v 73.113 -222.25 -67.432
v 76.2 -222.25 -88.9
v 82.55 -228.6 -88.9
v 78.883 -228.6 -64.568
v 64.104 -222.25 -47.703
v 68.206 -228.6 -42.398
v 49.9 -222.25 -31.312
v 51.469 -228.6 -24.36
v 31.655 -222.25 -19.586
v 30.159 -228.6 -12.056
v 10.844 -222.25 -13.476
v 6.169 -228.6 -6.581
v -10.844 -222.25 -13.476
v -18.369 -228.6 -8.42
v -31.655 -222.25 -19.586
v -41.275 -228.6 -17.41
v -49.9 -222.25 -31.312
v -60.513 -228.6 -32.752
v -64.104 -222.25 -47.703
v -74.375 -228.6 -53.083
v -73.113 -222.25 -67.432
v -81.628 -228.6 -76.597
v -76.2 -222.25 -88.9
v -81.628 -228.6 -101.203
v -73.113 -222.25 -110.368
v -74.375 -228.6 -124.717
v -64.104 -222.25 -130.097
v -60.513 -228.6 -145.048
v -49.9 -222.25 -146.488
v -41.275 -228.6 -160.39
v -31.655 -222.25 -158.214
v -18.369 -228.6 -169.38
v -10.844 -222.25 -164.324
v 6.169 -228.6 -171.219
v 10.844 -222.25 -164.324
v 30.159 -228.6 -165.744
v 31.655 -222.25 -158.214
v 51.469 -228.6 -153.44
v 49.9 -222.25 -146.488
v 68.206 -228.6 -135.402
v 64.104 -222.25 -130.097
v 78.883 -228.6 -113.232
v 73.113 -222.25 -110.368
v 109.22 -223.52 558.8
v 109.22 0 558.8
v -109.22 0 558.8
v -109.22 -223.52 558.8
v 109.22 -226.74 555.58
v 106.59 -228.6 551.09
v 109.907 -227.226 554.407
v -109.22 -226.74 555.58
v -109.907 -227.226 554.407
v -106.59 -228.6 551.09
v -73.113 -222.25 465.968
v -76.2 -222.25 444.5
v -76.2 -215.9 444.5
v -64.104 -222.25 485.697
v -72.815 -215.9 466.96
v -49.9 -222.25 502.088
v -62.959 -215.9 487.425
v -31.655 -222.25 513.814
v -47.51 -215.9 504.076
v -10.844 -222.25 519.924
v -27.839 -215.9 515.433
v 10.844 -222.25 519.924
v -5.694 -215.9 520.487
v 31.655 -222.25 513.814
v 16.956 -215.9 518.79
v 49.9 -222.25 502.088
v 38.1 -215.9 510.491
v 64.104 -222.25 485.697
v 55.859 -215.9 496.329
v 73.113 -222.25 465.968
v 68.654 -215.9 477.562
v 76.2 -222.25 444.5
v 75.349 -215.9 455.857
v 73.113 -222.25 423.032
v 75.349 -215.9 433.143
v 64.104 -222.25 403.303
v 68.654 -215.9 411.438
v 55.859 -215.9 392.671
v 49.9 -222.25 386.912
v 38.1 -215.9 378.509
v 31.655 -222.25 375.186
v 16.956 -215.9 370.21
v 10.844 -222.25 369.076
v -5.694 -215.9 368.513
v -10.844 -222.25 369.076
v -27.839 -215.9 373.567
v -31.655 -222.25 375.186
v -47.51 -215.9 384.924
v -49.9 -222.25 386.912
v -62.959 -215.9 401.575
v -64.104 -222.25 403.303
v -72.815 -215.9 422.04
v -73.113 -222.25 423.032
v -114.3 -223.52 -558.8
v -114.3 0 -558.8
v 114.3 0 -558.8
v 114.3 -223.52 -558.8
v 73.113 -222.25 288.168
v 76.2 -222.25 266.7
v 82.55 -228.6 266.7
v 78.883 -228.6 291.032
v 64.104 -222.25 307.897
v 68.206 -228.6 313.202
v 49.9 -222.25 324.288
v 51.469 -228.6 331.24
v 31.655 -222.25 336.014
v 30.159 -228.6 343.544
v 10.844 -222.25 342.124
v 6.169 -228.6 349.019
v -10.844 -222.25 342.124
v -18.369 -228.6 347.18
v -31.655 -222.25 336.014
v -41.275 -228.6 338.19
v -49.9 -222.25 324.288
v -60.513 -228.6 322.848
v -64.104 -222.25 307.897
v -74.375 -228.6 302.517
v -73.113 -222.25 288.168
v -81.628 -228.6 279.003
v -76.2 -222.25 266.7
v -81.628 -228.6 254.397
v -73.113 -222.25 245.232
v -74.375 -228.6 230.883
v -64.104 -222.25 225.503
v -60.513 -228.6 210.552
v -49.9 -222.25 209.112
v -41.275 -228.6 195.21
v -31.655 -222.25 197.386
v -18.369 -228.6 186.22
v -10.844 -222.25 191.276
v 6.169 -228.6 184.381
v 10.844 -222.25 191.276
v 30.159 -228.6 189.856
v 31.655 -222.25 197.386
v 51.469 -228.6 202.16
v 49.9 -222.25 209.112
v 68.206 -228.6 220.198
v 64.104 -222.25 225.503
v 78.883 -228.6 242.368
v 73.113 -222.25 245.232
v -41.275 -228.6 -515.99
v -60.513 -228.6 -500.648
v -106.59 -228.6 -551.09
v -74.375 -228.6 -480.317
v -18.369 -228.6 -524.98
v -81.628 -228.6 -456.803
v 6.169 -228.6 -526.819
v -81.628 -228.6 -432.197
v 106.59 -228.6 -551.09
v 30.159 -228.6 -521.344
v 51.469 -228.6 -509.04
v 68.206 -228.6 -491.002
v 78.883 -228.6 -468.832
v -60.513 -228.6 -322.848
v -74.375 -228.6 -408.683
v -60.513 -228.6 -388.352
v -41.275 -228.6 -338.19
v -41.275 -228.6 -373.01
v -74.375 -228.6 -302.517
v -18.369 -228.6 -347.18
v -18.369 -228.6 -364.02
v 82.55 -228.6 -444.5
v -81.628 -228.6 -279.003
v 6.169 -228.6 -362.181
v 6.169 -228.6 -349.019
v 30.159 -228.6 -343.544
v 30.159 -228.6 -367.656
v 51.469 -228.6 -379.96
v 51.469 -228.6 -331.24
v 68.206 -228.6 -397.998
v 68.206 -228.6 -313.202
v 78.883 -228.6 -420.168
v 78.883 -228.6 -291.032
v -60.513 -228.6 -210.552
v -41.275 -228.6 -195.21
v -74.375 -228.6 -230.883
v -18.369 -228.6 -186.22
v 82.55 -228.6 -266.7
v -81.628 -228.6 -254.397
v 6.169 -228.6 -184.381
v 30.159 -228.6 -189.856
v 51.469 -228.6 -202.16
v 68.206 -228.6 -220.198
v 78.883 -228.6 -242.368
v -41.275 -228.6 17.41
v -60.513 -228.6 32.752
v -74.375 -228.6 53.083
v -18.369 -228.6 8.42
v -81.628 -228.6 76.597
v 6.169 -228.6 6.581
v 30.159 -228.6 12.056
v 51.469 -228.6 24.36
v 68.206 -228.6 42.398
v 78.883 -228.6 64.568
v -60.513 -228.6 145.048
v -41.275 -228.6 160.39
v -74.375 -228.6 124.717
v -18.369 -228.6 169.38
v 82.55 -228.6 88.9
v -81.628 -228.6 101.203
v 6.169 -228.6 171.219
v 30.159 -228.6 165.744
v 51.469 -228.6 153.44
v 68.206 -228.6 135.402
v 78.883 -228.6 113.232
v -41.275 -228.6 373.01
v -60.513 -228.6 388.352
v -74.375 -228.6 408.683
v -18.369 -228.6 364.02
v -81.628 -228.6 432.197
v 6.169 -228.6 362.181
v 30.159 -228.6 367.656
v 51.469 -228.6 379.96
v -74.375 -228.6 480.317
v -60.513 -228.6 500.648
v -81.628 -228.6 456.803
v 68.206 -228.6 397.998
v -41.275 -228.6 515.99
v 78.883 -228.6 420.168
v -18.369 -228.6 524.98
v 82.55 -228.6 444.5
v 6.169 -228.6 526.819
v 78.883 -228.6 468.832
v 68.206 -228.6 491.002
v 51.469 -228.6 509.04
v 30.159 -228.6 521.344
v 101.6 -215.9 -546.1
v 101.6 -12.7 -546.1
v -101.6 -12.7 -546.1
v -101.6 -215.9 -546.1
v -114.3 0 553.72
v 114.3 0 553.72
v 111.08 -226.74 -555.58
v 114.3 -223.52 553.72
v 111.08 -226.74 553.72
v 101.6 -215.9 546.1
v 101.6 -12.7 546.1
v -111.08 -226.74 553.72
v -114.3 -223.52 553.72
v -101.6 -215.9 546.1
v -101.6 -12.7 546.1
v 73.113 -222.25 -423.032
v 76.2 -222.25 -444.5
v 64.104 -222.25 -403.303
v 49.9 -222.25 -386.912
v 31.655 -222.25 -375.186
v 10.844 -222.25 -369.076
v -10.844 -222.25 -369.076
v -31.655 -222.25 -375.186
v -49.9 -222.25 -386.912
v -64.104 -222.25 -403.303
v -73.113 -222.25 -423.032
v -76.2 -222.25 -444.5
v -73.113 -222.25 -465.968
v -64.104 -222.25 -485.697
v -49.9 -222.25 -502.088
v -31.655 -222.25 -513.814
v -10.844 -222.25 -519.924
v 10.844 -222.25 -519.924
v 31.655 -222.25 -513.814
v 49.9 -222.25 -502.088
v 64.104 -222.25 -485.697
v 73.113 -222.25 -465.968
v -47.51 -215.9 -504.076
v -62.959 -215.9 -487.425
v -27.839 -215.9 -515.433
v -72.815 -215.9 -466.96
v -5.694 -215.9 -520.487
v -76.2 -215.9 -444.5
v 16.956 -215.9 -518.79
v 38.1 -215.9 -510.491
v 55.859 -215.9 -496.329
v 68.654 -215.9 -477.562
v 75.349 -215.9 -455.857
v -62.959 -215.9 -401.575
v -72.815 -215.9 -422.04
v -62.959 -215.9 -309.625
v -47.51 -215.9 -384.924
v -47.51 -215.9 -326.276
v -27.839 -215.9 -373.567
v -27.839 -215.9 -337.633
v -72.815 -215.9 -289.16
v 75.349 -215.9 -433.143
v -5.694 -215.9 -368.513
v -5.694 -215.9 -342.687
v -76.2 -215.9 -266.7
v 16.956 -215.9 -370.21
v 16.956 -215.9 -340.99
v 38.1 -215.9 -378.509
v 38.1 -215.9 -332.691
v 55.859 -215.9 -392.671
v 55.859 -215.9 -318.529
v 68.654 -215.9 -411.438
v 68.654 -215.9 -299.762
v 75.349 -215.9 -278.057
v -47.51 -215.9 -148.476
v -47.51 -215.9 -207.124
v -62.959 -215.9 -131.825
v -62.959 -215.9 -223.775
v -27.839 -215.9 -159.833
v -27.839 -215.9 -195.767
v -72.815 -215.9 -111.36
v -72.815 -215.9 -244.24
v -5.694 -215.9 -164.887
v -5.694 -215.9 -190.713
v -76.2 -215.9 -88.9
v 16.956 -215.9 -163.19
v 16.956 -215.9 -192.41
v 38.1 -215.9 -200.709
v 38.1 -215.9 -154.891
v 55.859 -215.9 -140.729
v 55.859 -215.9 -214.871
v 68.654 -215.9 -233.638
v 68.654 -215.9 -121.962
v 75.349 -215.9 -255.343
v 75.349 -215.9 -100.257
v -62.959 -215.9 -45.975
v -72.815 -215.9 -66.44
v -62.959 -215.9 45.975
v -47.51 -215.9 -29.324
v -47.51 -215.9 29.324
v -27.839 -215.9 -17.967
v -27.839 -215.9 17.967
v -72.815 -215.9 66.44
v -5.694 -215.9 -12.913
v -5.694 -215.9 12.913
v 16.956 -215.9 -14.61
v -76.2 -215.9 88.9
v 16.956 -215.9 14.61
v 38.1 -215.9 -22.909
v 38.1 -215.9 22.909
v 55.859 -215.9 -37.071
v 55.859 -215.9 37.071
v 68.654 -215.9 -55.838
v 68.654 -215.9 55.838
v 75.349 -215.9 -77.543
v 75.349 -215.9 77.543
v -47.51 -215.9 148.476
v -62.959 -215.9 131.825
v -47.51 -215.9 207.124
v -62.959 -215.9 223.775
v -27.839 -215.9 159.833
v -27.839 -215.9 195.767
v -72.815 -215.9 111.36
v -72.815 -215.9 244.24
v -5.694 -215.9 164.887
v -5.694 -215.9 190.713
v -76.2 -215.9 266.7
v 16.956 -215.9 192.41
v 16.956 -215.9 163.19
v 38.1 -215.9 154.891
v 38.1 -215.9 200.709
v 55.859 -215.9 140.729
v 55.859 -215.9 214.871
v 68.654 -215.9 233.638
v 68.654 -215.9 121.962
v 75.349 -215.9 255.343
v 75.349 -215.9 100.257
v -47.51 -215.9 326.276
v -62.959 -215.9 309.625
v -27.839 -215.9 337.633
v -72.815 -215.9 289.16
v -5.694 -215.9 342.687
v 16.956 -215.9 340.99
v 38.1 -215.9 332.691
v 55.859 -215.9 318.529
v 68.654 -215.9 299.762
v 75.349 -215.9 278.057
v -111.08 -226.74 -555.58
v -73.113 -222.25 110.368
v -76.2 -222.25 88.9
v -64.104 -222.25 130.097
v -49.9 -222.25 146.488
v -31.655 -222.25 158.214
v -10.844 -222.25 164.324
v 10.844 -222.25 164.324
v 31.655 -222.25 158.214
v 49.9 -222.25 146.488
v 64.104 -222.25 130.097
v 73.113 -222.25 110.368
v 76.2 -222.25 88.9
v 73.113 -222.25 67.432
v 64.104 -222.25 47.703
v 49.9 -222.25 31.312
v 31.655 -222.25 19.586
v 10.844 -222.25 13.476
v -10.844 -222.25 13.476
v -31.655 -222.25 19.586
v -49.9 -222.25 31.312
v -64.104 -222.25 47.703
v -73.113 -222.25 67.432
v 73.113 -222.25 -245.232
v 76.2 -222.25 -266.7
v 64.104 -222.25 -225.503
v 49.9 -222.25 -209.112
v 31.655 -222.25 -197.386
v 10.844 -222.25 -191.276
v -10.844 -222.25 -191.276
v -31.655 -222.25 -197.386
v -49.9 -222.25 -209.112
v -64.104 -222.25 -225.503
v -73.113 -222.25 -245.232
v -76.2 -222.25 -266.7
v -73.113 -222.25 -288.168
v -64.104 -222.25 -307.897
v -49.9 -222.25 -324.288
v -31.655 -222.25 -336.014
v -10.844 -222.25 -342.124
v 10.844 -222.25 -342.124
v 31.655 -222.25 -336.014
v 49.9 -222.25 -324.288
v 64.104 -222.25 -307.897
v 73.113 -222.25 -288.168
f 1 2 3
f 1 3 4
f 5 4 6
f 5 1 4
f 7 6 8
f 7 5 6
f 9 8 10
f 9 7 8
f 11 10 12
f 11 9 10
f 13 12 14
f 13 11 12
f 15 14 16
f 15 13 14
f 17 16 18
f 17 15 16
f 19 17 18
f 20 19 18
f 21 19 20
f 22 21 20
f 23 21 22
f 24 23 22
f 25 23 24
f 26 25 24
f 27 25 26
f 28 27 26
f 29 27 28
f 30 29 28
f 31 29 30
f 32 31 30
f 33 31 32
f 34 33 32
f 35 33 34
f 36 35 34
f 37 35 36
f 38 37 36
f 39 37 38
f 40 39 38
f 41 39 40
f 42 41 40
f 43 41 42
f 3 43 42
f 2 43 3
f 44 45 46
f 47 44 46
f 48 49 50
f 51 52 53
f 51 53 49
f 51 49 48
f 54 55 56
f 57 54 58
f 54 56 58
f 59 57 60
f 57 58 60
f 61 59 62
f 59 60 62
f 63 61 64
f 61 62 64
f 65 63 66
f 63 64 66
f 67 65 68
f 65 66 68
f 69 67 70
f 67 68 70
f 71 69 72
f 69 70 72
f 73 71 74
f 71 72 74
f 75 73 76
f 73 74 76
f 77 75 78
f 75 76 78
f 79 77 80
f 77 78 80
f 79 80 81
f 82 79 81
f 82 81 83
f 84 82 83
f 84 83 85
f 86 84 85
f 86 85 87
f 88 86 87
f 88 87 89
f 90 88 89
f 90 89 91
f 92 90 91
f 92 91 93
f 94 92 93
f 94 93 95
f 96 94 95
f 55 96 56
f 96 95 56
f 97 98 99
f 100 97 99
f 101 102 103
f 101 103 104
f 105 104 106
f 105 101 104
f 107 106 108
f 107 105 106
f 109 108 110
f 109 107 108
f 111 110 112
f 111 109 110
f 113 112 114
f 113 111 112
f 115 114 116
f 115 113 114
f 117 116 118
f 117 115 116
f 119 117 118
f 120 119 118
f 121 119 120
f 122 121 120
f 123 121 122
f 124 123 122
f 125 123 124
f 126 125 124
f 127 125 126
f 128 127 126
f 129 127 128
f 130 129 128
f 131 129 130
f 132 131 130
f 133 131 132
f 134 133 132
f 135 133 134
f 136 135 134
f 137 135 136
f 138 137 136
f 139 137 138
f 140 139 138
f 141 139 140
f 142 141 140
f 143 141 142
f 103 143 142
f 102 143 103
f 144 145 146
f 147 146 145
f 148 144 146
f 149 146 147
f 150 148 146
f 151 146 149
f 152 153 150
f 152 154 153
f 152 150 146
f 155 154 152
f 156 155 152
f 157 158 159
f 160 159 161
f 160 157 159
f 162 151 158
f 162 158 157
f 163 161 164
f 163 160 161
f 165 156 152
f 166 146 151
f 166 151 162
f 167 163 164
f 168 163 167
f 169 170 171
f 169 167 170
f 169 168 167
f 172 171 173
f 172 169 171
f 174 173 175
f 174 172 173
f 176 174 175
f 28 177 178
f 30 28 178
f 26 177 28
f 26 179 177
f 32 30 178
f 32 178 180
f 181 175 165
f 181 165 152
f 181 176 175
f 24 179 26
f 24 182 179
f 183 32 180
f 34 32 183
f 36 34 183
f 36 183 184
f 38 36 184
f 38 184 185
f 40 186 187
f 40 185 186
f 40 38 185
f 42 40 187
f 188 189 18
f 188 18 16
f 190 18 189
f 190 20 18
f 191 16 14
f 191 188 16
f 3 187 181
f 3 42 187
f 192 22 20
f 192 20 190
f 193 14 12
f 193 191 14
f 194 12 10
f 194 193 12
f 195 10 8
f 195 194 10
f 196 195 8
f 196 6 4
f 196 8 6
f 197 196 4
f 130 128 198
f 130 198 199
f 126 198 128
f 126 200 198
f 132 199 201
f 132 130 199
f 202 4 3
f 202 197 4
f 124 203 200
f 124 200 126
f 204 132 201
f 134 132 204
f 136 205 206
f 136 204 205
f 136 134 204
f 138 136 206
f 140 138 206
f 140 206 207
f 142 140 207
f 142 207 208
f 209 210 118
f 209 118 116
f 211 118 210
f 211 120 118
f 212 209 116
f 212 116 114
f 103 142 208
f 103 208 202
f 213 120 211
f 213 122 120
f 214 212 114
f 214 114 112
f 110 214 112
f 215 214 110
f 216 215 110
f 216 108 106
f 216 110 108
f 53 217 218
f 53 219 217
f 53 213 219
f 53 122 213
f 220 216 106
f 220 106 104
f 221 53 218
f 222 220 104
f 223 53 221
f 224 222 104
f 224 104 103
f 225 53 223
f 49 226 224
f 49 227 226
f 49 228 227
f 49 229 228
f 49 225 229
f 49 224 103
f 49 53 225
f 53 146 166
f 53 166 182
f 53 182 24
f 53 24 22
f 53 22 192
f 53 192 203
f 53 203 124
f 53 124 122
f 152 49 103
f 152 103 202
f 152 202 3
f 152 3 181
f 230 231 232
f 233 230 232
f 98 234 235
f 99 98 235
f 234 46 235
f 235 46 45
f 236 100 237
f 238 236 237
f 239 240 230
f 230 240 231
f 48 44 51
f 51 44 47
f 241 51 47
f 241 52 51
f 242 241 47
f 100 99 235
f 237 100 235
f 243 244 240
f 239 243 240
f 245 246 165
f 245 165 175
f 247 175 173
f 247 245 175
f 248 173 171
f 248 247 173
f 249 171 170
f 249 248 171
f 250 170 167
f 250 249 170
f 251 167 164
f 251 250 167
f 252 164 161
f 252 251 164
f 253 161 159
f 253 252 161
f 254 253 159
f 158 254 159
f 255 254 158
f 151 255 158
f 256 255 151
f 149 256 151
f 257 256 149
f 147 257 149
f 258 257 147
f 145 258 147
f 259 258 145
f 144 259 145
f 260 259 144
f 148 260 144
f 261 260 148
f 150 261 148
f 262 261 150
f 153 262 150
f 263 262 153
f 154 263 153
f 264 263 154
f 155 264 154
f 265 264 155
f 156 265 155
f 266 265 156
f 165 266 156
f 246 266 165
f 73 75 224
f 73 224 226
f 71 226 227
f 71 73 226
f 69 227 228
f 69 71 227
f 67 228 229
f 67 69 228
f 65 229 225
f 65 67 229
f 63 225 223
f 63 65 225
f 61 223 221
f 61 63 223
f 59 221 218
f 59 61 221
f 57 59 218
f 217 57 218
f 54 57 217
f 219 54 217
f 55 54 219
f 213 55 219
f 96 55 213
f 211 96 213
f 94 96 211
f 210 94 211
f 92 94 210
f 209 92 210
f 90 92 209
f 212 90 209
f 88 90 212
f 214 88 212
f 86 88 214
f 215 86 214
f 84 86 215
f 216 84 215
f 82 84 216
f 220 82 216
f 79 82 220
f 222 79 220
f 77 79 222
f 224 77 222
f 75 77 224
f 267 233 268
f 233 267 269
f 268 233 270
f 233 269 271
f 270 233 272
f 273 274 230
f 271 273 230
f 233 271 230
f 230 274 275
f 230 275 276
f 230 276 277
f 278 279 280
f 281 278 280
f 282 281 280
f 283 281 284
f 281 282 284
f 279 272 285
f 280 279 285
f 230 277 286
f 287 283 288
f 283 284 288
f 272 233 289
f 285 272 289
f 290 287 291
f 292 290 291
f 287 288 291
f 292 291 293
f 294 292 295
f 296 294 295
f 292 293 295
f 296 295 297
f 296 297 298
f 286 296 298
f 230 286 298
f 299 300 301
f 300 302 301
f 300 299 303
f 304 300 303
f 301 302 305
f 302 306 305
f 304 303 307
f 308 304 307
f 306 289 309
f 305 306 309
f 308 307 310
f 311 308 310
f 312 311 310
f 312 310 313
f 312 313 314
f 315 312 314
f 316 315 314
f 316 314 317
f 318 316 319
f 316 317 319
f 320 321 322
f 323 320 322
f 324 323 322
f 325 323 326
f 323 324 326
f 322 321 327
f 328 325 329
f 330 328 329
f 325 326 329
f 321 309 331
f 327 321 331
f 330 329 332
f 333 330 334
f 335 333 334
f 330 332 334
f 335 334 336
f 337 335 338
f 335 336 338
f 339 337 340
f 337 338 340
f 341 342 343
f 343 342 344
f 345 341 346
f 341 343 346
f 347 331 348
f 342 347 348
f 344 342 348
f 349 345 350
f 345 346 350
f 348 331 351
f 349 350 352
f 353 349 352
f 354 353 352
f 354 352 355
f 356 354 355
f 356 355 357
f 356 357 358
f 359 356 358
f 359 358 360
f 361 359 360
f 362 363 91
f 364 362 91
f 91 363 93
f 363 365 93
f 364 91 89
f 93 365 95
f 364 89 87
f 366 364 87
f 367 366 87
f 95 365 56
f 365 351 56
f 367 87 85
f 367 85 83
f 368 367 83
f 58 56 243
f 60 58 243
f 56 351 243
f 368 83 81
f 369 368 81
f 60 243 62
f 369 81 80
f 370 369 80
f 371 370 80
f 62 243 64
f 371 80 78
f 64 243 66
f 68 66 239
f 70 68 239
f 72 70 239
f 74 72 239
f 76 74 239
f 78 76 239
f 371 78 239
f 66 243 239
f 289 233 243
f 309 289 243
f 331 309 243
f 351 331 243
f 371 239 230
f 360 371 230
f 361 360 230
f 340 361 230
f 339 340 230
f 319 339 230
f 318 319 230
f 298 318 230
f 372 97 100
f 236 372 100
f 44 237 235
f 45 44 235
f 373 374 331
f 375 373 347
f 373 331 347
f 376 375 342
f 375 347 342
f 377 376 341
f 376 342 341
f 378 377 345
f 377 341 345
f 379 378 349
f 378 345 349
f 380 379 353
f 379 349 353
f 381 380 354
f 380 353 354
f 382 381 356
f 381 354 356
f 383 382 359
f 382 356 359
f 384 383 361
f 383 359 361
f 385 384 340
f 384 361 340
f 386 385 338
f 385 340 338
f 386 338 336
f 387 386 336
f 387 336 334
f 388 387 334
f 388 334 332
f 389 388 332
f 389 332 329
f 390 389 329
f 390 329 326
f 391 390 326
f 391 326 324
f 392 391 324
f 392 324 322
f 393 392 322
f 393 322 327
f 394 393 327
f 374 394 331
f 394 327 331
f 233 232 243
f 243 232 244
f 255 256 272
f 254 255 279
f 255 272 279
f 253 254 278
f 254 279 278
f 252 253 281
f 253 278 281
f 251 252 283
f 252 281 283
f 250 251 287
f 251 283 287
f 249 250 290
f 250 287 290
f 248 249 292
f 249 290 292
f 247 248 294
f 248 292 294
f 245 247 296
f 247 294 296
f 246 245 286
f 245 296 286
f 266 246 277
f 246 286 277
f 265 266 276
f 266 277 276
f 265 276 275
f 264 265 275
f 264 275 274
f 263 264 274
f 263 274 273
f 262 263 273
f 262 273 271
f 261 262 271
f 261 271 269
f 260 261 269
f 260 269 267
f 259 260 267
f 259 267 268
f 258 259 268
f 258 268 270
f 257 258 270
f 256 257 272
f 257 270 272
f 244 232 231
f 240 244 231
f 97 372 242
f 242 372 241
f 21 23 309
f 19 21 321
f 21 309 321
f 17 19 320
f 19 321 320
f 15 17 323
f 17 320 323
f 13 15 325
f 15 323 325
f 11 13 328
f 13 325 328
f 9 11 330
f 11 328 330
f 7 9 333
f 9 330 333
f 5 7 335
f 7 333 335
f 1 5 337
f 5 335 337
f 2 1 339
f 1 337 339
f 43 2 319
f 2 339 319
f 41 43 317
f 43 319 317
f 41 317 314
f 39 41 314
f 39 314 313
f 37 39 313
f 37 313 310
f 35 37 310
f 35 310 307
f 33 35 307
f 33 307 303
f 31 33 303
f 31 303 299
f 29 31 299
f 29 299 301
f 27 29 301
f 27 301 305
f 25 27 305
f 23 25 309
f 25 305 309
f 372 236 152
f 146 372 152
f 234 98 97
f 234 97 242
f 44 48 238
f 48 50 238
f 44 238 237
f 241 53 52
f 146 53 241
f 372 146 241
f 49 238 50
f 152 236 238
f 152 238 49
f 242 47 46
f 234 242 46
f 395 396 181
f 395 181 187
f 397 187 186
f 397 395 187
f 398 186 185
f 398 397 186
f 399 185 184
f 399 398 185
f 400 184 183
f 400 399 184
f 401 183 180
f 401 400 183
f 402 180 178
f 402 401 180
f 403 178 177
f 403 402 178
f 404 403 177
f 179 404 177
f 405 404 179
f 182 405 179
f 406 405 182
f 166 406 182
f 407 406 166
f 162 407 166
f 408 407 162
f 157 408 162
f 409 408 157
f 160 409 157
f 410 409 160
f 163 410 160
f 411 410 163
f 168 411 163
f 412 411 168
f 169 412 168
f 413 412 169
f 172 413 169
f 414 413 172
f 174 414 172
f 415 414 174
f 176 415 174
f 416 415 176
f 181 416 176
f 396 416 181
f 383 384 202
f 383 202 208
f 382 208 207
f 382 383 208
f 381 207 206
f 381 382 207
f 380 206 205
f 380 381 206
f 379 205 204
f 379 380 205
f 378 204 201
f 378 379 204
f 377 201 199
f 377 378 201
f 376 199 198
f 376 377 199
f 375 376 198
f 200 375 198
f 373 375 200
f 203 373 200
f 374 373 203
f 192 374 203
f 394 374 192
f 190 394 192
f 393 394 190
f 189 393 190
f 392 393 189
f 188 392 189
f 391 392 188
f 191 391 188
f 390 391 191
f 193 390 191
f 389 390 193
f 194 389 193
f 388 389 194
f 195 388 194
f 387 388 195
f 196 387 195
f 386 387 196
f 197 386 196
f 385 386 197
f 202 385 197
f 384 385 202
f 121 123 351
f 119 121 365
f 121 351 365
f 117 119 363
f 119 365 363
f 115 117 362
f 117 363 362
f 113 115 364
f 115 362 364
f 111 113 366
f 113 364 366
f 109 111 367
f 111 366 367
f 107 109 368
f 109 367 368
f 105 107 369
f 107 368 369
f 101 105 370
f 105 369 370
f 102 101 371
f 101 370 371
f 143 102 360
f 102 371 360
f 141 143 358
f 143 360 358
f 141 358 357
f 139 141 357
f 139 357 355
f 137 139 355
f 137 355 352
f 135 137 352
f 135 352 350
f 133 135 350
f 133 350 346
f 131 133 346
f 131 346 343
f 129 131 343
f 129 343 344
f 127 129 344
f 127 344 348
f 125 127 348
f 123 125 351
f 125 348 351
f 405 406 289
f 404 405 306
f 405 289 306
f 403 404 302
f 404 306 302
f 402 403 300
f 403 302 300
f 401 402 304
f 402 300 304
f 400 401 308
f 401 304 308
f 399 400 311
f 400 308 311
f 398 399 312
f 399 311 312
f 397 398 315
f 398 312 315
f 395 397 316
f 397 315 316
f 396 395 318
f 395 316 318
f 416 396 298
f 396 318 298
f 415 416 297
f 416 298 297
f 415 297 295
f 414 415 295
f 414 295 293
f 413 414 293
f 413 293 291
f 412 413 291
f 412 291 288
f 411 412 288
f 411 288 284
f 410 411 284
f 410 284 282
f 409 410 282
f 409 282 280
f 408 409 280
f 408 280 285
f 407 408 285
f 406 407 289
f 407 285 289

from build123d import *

# Parameters (mm, degrees)
F0_W        = 228.6
F0_H        = 1117.6
F1_DEPTH    = 12.7
F3_DEPTH    = 203.2
F4_W        = 114.3
F4_H        = 1117.6
F5_DEPTH    = 12.7
F7_D        = 152.4
F7_DEPTH    = 25.4
F7_TIP      = 45.7855791699
F8_SIZE     = 5.08
F9_T1_DEPTH = 232.7728499247
F9_T3_DEPTH = 1121.7728499247


# Not quite as in the source:
# - a fillet or chamfer that OpenCascade refuses, or shapes differently, is made with other operations: its cross-section is extruded or revolved along the edge and cut away or added


with BuildPart() as f1:
    # F0 (on Front) → F1 (new body)
    with BuildSketch(Plane.XZ):
        Rectangle(F0_W, F0_H)
    extrude(amount=F1_DEPTH)

    # F2 (on face) → F3 (join)
    with BuildSketch(Plane.XZ.offset(12.7)):
        Polygon((-101.6, 546.1), (-114.3, 558.8), (-114.3, -558.8), (-101.6, -546.1), align=None)
        Polygon((114.3, 558.8), (-114.3, 558.8), (-101.6, 546.1), (101.6, 546.1), align=None)
        Polygon((114.3, -558.8), (114.3, 558.8), (101.6, 546.1), (101.6, -546.1), align=None)
        Polygon((-101.6, -546.1), (-114.3, -558.8), (114.3, -558.8), (101.6, -546.1), align=None)
    extrude(amount=F3_DEPTH)

    # F4 (on face) → F5 (join)
    with BuildSketch(Plane.XZ.offset(215.9)):
        with Locations((-57.15, 0)):
            Rectangle(F4_W, F4_H)
        with Locations((57.15, 0)):
            Rectangle(F4_W, F4_H)
    extrude(amount=F5_DEPTH)

    # F7
    with Locations(Plane.XZ.offset(228.6)):
        with Locations((0, -444.5), (0, -266.7), (0, -88.9), (0, 88.9), (0, 266.7), (0, 444.5)):
            Hole(F7_D / 2, depth=F7_DEPTH)
            with Locations((0, 0, -(F7_DEPTH + F7_TIP / 2))):  # 118° drill point
                Cone(0, F7_D / 2, F7_TIP, mode=Mode.SUBTRACT)

    # F8
    f8_edges = [f1.edges().sort_by_distance(p)[0] for p in [
        (0, -228.6, -558.8),
        (114.3, -228.6, 0),
        (-114.3, -228.6, 0),
        (0, -228.6, 558.8),
        (-114.3, -114.3, 558.8),
        (114.3, -114.3, 558.8),
    ]]
    chamfer(f8_edges, length=F8_SIZE)

    # F9: chamfer of 6.35 on 10 edges, made by hand

    # F9_s2 → F9_t1 (cut)
    with BuildSketch(Plane.YZ.offset(-116.3864249623)):
        Polygon((-226.7401280605, -555.5798719395), (-228.6, -551.0897438789), (-228.6, -553.72), align=None)
        Polygon((-228.6, 551.0897438789), (-226.7401280605, 555.5798719395), (-228.6, 553.72), align=None)
    extrude(amount=F9_T1_DEPTH, mode=Mode.SUBTRACT)

    # F9_s4 → F9_t3 (cut)
    with BuildSketch(Plane.XY.offset(-560.8864249623)):
        Polygon((-106.5897438789, -228.6), (-111.0798719395, -226.7401280605), (-109.22, -228.6), align=None)
        Polygon((111.0798719395, -226.7401280605), (106.5897438789, -228.6), (109.22, -228.6), align=None)
    extrude(amount=F9_T3_DEPTH, mode=Mode.SUBTRACT)

    # F9_s5 → F9_t6 (revolve, cut)
    with BuildSketch(Plane.XY.offset(-444.5)):
        Polygon((82.55, -228.6), (76.2, -222.25), (76.2, -228.6), align=None)
    revolve(axis=Axis((0, -228.6, -444.5), (0, -1, 0)), mode=Mode.SUBTRACT)

    # F9_s7 → F9_t8 (revolve, cut)
    with BuildSketch(Plane.XY.offset(-266.7)):
        Polygon((82.55, -228.6), (76.2, -222.25), (76.2, -228.6), align=None)
    revolve(axis=Axis((0, -228.6, -266.7), (0, -1, 0)), mode=Mode.SUBTRACT)

    # F9_s9 → F9_t10 (revolve, cut)
    with BuildSketch(Plane.XY.offset(-88.9)):
        Polygon((82.55, -228.6), (76.2, -222.25), (76.2, -228.6), align=None)
    revolve(axis=Axis((0, -228.6, -88.9), (0, -1, 0)), mode=Mode.SUBTRACT)

    # F9_s11 → F9_t12 (revolve, cut)
    with BuildSketch(Plane.XY.offset(88.9)):
        Polygon((82.55, -228.6), (76.2, -222.25), (76.2, -228.6), align=None)
    revolve(axis=Axis((0, -228.6, 88.9), (0, -1, 0)), mode=Mode.SUBTRACT)

    # F9_s13 → F9_t14 (revolve, cut)
    with BuildSketch(Plane.XY.offset(266.7)):
        Polygon((82.55, -228.6), (76.2, -222.25), (76.2, -228.6), align=None)
    revolve(axis=Axis((0, -228.6, 266.7), (0, -1, 0)), mode=Mode.SUBTRACT)

    # F9_s15 → F9_t16 (revolve, cut)
    with BuildSketch(Plane.XY.offset(444.5)):
        Polygon((82.55, -228.6), (76.2, -222.25), (76.2, -228.6), align=None)
    revolve(axis=Axis((0, -228.6, 444.5), (0, -1, 0)), mode=Mode.SUBTRACT)


solid = f1.part
